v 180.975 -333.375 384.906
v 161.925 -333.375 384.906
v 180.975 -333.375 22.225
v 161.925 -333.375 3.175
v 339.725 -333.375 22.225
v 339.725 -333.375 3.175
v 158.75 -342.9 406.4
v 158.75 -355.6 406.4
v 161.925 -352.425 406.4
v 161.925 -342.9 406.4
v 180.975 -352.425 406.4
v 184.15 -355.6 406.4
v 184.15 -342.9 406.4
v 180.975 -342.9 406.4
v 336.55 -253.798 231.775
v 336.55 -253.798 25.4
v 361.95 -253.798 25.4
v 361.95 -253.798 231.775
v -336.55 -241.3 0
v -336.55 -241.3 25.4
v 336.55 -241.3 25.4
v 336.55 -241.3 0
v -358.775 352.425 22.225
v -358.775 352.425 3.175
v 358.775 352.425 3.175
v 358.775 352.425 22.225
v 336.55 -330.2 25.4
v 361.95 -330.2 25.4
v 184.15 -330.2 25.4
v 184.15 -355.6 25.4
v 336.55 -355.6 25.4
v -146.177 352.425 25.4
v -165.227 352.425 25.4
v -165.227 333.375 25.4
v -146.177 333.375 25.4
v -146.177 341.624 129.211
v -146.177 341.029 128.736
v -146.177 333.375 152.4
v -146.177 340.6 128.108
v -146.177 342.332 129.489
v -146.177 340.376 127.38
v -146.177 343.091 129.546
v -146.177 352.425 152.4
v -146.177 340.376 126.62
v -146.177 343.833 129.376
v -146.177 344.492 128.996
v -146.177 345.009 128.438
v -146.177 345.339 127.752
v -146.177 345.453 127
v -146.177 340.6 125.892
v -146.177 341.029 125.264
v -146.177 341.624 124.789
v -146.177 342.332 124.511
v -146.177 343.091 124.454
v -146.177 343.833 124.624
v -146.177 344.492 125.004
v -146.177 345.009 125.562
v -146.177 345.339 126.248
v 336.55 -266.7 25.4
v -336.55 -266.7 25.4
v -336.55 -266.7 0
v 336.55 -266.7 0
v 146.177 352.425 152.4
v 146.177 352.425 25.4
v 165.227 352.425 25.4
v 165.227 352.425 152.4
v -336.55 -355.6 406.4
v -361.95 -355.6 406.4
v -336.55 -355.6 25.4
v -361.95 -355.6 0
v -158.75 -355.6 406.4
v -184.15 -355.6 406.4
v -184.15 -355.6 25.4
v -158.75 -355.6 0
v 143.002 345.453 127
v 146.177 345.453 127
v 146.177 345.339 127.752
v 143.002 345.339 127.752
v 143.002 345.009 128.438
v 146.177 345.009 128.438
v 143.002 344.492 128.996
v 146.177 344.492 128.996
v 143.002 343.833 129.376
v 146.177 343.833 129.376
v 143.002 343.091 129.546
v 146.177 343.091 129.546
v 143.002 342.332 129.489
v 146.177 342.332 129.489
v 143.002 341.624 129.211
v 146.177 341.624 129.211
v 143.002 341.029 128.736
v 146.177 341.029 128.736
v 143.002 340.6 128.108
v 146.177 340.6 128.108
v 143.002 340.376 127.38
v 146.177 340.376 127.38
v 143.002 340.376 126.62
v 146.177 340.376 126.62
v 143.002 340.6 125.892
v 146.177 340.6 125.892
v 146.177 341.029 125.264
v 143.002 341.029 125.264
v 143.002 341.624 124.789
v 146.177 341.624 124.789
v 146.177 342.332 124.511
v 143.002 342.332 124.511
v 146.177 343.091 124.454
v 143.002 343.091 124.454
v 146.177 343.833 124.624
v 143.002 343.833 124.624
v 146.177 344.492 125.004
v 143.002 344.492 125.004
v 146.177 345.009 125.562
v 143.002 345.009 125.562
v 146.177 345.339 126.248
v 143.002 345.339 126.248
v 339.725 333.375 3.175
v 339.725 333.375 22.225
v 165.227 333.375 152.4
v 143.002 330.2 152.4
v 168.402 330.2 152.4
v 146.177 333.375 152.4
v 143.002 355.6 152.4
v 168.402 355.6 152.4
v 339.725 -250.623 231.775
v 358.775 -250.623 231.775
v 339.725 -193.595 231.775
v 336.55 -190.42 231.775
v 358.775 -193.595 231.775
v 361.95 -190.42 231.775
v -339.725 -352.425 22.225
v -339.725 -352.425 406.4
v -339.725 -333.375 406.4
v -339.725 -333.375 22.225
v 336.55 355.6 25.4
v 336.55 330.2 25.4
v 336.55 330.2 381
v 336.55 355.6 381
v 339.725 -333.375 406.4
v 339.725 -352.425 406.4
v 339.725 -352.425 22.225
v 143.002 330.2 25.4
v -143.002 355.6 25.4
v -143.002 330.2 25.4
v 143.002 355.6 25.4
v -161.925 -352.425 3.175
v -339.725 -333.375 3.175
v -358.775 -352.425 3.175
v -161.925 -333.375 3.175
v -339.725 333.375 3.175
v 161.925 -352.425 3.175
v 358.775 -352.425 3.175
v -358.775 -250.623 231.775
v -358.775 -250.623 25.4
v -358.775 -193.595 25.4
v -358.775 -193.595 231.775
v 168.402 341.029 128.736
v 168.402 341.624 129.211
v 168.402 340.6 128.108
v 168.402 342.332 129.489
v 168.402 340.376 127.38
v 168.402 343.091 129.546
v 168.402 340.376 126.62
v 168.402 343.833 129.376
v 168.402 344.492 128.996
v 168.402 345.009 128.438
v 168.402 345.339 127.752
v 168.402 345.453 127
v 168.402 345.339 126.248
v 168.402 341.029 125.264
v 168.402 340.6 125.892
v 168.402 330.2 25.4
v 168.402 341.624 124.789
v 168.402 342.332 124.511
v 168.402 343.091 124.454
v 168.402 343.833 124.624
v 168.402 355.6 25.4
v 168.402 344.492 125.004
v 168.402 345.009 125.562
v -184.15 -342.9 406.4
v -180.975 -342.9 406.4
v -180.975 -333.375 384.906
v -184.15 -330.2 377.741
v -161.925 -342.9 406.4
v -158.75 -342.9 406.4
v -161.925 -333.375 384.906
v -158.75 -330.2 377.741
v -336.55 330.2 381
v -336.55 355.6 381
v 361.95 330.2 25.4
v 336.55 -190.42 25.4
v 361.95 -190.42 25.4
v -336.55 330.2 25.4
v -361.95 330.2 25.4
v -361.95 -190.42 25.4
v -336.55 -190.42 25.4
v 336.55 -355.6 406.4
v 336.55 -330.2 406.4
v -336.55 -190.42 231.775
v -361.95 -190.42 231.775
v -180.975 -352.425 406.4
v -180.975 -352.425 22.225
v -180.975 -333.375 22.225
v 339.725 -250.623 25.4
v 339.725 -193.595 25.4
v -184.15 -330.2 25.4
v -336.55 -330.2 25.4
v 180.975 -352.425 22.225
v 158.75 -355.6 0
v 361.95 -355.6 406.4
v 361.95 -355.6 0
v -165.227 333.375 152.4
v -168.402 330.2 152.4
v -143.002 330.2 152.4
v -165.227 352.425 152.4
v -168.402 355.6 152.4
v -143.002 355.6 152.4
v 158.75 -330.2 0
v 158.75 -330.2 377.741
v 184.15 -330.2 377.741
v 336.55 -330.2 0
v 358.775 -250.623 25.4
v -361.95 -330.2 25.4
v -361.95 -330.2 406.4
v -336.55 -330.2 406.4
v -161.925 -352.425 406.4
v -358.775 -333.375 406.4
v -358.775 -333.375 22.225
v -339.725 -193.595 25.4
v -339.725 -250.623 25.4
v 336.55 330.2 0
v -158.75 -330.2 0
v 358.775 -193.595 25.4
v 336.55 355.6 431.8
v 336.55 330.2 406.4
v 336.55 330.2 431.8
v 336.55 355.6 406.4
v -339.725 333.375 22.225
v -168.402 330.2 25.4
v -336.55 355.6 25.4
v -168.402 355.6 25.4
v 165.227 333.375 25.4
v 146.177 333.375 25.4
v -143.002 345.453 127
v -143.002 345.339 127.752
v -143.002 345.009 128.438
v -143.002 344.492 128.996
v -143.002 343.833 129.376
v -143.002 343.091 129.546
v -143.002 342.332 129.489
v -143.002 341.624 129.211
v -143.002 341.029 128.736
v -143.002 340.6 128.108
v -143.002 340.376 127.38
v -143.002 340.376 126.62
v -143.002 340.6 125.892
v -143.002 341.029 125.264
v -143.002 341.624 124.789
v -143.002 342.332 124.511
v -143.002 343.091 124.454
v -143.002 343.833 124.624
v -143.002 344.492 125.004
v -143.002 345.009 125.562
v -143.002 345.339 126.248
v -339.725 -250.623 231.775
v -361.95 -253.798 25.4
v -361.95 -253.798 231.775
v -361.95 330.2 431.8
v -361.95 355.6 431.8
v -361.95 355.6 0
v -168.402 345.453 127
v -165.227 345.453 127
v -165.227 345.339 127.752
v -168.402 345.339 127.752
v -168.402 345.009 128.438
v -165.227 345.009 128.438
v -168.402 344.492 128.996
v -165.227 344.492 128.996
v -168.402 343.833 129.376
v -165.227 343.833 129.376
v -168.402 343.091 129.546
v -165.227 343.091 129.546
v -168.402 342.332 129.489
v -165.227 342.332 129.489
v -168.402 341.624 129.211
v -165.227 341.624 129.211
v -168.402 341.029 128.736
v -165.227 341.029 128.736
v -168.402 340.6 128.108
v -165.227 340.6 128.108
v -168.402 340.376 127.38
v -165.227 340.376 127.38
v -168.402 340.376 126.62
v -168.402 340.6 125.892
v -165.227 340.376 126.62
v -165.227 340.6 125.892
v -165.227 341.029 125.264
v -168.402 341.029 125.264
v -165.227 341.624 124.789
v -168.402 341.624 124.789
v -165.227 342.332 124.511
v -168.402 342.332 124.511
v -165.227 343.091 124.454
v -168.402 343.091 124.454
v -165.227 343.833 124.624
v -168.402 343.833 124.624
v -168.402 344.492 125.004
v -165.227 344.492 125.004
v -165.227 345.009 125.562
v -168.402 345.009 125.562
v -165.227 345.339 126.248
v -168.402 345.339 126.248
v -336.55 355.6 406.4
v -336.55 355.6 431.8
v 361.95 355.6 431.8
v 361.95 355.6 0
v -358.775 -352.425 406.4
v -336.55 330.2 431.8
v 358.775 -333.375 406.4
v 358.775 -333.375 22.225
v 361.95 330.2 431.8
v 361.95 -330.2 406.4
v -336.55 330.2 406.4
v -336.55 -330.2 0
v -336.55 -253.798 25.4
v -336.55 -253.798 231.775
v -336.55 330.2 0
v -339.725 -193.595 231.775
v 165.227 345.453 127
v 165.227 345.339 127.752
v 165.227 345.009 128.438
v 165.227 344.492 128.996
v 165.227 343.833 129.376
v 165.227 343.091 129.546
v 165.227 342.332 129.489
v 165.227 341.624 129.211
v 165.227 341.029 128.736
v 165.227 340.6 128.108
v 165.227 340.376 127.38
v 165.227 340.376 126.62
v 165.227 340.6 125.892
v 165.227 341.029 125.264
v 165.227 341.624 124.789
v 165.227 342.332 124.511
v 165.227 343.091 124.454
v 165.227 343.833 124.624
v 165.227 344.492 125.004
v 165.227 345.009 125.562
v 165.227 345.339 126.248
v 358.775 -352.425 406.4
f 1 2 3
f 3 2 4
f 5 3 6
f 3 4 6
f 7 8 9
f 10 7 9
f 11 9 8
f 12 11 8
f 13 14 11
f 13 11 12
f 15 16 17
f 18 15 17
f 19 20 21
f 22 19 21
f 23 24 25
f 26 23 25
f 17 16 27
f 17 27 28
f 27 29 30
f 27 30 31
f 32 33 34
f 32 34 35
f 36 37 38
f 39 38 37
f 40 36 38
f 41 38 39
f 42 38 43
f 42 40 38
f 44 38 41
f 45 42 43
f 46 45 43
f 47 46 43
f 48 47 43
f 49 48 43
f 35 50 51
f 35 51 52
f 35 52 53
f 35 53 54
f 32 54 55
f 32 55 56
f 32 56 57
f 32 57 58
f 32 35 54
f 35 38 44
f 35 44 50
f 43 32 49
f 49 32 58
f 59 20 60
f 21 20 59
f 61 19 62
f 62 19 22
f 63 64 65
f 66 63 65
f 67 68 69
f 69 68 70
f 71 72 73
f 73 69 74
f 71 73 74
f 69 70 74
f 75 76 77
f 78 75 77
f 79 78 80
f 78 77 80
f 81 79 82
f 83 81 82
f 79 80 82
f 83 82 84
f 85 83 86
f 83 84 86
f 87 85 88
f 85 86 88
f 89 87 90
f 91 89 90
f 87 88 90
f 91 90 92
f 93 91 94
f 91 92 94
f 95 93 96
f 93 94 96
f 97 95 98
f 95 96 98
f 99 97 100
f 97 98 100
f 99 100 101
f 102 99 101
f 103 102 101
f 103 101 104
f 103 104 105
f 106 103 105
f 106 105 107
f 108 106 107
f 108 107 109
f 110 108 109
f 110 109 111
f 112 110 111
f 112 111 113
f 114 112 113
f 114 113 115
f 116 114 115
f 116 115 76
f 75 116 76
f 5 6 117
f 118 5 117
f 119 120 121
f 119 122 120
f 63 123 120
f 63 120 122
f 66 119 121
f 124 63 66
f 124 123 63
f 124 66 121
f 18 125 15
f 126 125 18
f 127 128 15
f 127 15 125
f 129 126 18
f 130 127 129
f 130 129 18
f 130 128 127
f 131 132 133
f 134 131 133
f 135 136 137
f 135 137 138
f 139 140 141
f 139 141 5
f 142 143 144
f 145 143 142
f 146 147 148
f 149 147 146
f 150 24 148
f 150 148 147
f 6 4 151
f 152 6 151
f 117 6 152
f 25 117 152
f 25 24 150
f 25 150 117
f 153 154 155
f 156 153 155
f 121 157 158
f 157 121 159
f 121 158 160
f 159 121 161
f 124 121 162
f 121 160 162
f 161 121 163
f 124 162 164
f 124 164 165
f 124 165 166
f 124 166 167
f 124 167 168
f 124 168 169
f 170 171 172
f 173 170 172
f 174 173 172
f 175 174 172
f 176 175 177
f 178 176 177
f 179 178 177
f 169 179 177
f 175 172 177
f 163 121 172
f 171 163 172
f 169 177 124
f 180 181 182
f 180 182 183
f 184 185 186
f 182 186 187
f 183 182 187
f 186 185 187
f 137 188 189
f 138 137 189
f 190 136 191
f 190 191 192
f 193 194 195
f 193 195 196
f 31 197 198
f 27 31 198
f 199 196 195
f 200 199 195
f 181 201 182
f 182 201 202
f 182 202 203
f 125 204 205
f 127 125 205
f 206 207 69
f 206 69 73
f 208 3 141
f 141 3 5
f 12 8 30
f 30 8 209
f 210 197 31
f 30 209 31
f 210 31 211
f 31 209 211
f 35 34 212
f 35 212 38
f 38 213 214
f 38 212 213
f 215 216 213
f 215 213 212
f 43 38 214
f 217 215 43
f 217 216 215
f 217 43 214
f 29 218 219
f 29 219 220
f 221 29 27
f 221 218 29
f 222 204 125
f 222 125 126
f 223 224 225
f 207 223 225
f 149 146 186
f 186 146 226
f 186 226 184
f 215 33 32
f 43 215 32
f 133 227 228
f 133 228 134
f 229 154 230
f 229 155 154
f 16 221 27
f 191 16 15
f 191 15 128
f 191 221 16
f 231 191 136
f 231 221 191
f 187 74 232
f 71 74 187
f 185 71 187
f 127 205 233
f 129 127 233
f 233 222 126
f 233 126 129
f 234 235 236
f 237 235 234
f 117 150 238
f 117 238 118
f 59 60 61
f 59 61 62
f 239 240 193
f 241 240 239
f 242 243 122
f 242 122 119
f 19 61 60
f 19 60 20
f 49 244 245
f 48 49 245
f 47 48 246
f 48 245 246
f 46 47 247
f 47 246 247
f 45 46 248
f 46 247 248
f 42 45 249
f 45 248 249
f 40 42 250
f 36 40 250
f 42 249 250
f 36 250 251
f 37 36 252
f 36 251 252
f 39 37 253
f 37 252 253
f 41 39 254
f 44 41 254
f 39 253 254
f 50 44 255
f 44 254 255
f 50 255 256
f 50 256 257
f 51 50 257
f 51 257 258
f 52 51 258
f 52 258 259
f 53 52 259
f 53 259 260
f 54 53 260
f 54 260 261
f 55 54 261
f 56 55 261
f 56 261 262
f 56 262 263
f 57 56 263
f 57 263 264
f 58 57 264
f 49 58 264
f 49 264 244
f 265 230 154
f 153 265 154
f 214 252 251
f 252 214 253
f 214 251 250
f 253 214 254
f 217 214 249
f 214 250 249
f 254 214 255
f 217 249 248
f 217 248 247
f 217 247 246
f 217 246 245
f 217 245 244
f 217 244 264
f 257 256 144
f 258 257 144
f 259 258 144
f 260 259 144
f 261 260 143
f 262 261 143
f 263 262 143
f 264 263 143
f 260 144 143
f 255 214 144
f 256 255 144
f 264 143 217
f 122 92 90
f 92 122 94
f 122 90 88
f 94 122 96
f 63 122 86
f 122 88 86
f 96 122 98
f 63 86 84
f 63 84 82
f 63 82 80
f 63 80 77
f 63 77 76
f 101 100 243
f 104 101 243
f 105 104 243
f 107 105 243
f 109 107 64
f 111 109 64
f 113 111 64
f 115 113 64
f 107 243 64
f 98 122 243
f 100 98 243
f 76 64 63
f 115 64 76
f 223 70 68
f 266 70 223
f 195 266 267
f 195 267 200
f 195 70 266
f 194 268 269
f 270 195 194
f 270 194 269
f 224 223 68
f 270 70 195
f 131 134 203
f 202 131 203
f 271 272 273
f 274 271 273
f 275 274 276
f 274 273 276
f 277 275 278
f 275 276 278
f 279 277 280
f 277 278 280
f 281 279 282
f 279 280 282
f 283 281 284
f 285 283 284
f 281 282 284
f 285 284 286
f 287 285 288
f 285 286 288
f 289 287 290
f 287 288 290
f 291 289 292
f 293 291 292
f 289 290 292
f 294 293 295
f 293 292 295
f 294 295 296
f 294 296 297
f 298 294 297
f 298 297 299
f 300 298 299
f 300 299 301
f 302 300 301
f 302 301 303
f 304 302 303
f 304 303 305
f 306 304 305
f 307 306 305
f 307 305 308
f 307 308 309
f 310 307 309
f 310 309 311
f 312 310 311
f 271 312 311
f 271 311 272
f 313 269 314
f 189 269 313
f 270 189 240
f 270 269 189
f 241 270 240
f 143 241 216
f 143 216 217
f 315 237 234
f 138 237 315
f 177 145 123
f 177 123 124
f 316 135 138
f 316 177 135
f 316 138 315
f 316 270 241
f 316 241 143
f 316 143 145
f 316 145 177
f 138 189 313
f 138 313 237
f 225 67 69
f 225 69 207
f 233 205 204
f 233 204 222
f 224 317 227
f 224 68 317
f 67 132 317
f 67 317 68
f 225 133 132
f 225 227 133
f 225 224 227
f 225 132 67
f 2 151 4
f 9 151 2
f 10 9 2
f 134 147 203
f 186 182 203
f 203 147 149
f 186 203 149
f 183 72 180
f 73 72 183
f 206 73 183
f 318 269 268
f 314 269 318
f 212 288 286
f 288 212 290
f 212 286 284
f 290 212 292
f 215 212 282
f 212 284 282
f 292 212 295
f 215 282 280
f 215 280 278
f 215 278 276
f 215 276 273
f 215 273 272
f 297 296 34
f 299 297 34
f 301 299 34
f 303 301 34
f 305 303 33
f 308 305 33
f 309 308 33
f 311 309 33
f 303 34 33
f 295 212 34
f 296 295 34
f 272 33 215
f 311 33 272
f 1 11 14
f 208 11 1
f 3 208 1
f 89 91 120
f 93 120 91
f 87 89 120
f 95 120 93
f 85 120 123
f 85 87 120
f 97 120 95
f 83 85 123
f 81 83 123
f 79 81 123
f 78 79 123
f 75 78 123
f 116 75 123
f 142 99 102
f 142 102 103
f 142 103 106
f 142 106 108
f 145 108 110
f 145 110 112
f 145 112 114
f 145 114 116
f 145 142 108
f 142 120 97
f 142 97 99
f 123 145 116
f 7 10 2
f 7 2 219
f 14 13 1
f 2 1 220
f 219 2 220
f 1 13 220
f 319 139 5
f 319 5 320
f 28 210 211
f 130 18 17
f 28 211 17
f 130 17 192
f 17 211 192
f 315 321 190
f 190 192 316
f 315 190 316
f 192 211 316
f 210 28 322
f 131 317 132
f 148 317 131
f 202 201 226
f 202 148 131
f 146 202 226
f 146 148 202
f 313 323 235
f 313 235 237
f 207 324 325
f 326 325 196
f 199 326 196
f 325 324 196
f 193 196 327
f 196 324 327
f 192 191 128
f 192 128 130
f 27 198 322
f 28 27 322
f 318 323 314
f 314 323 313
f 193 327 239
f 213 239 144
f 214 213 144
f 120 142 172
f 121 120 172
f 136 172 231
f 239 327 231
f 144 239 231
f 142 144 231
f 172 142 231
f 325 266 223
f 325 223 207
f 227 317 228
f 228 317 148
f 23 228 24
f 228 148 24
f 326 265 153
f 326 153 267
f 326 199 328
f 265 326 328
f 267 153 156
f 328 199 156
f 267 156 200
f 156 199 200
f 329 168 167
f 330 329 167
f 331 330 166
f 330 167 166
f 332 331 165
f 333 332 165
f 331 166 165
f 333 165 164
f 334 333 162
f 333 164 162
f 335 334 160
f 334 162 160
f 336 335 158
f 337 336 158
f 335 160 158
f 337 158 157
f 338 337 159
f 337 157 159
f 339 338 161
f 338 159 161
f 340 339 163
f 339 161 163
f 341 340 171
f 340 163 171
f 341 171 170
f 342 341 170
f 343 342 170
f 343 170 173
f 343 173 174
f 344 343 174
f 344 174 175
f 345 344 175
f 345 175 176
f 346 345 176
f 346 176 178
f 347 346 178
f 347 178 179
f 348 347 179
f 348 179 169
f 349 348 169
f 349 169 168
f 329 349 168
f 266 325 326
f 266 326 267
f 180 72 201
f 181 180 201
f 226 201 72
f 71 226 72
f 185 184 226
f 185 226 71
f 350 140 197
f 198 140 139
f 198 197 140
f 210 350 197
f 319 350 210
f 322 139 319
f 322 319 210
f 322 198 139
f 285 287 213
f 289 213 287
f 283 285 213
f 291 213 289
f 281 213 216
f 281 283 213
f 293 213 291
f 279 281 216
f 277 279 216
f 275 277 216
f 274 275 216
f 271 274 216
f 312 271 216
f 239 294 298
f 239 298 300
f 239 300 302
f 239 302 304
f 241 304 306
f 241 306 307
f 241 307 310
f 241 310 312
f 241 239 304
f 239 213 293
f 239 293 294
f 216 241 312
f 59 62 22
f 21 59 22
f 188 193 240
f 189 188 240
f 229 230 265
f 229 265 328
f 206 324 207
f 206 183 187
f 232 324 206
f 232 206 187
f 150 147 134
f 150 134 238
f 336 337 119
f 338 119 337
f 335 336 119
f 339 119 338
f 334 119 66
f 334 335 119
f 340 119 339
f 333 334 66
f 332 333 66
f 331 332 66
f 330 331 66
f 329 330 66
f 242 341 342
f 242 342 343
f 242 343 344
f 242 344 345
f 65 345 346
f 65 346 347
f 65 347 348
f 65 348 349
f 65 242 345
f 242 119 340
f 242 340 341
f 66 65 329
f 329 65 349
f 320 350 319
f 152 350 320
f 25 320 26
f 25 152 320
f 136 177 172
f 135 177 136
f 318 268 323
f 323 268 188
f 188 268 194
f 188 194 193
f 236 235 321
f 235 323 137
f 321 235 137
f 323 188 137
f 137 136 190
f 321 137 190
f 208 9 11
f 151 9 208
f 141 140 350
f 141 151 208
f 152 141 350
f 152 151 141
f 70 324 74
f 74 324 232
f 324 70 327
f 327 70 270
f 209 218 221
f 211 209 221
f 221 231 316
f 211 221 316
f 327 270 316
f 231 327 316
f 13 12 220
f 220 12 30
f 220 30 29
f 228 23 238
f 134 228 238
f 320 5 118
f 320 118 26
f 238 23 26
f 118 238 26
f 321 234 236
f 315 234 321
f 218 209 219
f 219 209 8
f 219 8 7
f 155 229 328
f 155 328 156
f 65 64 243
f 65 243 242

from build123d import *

# Parameters (mm, degrees)
F0_W      = 723.9
F0_H      = 711.2
F0_W_2    = 673.1
F0_H_2    = 660.4
F1_DEPTH  = 25.4
F2_W      = 25.4
F2_H      = 25.4
F3_DEPTH  = 381
F4_W      = 25.4
F4_H      = 25.4
F5_DEPTH  = 381
F6_W      = 673.1
F6_H      = 25.4
F7_DEPTH  = 25.4
F8_W      = 317.5
F8_H      = 25.4
F9_DEPTH  = 25.4
F10_T     = -3.175
F11_W     = 25.4
F11_H     = 25.4
F12_DEPTH = 406.4
F13_W     = 25.4
F13_H     = 25.4
F14_DEPTH = 673.1
F15_W     = 25.4
F15_H     = 63.3782297373
F15_W_2   = 19.05
F15_H_2   = 57.0282297373
F16_DEPTH = 206.375
F17_W     = 25.4
F17_H     = 25.4
F17_W_2   = 19.05
F17_H_2   = 19.05
F18_DEPTH = 127
F20_D     = 5.1054
F20_DEPTH = 406.4
F20_TIP   = 1.5338169022
F22_DEPTH = 406.4


# Not quite as in the source:
# - a pattern or mirror of a feature is missing from the dataset's text; its kind, count and spacing are read off the source's solid


with BuildPart() as f1:
    # F0 (on Top) → F1 (new body)
    with BuildSketch(Plane.XY):
        Rectangle(F0_W, F0_H)
        Rectangle(F0_W_2, F0_H_2, mode=Mode.SUBTRACT)
    extrude(amount=F1_DEPTH)

    # F2 (on face) → F3 (join)
    with BuildSketch(Plane.XY.offset(25.4)):
        with Locations((-349.25, -342.9)):
            Rectangle(F2_W, F2_H)
        with Locations((349.25, -342.9)):
            Rectangle(F2_W, F2_H)
    extrude(amount=F3_DEPTH)

    # F4 (on face) → F5 (join)
    with BuildSketch(Plane.XY.offset(25.4)):
        with Locations((-171.45, -342.9)):
            Rectangle(F4_W, F4_H)
        with Locations((171.45, -342.9)):
            Rectangle(F4_W, F4_H)
    extrude(amount=F5_DEPTH)

    # F8 (on face) → F9 (cut)
    with BuildSketch(Plane.XY.offset(25.4)):
        with Locations((0, -342.9)):
            Rectangle(F8_W, F8_H)
    extrude(amount=-F9_DEPTH, mode=Mode.SUBTRACT)

    # F10
    f10_openings = [f1.faces().sort_by_distance(p)[0] for p in [
        (-349.25, -342.9, 406.4),
        (-171.45, -342.9, 406.4),
        (171.45, -342.9, 406.4),
        (349.25, -342.9, 406.4),
    ]]
    offset(amount=F10_T, openings=f10_openings, kind=Kind.INTERSECTION)

    # F11 (on face) → F12 (join)
    with BuildSketch(Plane.XY.offset(25.4)):
        with Locations((349.25, 342.9)):
            Rectangle(F11_W, F11_H)
        with Locations((-349.25, 342.9)):
            Rectangle(F11_W, F11_H)
    extrude(amount=F12_DEPTH)

    # F13 (on face) → F14 (join)
    with BuildSketch(Plane.YZ.offset(-336.55)):
        with Locations((342.9, 393.7)):
            Rectangle(F13_W, F13_H)
    extrude(amount=F14_DEPTH)

    # F15 (on face) → F16 (join)
    with BuildSketch(Plane.XY.offset(25.4)):
        with Locations((349.25, -222.1086844802)):
            Rectangle(F15_W, F15_H)
        with Locations((349.25, -222.1086844802)):
            Rectangle(F15_W_2, F15_H_2, mode=Mode.SUBTRACT)
    f16 = extrude(amount=F16_DEPTH)

    # F16_copies: F16 across plane
    add(f16.mirror(Plane(origin=(0, 0, 0), x_dir=(0, 0, -1), z_dir=(-1, 0, 0))))

    # F17 (on face) → F18 (join)
    with BuildSketch(Plane.XY.offset(25.4)):
        with Locations((-155.702, 342.9)):
            Rectangle(F17_W, F17_H)
        with Locations((-155.702, 342.9)):
            Rectangle(F17_W_2, F17_H_2, mode=Mode.SUBTRACT)
        with Locations((155.702, 342.9)):
            Rectangle(F17_W, F17_H)
        with Locations((155.702, 342.9)):
            Rectangle(F17_W_2, F17_H_2, mode=Mode.SUBTRACT)
    extrude(amount=F18_DEPTH)

    # F20 (one way)
    with BuildSketch(Plane.YZ.offset(168.402)):
        with Locations((342.9, 127)):
            Circle(F20_D / 2)
    extrude(amount=-F20_DEPTH, mode=Mode.SUBTRACT)
    with Locations(Plane.YZ.offset(168.402)):
        with Locations((342.9, 127)):
            with Locations((0, 0, -(F20_DEPTH + F20_TIP / 2))):  # 118° drill point
                Cone(0, F20_D / 2, F20_TIP, mode=Mode.SUBTRACT)

    # F21 (on face) → F22 (cut)
    with BuildSketch(Plane.YZ.offset(184.15)):
        Polygon((-351.5427708626, 424.6743917465), (-342.9, 406.4), (-303.1188249588, 316.628485918), (-308.5665404797, 412.8710329533), align=None)
    extrude(amount=-F22_DEPTH, mode=Mode.SUBTRACT)


with BuildPart() as f7:
    # F6 (on face) → F7 (new body)
    with BuildSketch(Plane.XY.offset(25.4)):
        with Locations((0, -254)):
            Rectangle(F6_W, F6_H)
    extrude(amount=-F7_DEPTH)


solid = Compound([f1.part, f7.part])
